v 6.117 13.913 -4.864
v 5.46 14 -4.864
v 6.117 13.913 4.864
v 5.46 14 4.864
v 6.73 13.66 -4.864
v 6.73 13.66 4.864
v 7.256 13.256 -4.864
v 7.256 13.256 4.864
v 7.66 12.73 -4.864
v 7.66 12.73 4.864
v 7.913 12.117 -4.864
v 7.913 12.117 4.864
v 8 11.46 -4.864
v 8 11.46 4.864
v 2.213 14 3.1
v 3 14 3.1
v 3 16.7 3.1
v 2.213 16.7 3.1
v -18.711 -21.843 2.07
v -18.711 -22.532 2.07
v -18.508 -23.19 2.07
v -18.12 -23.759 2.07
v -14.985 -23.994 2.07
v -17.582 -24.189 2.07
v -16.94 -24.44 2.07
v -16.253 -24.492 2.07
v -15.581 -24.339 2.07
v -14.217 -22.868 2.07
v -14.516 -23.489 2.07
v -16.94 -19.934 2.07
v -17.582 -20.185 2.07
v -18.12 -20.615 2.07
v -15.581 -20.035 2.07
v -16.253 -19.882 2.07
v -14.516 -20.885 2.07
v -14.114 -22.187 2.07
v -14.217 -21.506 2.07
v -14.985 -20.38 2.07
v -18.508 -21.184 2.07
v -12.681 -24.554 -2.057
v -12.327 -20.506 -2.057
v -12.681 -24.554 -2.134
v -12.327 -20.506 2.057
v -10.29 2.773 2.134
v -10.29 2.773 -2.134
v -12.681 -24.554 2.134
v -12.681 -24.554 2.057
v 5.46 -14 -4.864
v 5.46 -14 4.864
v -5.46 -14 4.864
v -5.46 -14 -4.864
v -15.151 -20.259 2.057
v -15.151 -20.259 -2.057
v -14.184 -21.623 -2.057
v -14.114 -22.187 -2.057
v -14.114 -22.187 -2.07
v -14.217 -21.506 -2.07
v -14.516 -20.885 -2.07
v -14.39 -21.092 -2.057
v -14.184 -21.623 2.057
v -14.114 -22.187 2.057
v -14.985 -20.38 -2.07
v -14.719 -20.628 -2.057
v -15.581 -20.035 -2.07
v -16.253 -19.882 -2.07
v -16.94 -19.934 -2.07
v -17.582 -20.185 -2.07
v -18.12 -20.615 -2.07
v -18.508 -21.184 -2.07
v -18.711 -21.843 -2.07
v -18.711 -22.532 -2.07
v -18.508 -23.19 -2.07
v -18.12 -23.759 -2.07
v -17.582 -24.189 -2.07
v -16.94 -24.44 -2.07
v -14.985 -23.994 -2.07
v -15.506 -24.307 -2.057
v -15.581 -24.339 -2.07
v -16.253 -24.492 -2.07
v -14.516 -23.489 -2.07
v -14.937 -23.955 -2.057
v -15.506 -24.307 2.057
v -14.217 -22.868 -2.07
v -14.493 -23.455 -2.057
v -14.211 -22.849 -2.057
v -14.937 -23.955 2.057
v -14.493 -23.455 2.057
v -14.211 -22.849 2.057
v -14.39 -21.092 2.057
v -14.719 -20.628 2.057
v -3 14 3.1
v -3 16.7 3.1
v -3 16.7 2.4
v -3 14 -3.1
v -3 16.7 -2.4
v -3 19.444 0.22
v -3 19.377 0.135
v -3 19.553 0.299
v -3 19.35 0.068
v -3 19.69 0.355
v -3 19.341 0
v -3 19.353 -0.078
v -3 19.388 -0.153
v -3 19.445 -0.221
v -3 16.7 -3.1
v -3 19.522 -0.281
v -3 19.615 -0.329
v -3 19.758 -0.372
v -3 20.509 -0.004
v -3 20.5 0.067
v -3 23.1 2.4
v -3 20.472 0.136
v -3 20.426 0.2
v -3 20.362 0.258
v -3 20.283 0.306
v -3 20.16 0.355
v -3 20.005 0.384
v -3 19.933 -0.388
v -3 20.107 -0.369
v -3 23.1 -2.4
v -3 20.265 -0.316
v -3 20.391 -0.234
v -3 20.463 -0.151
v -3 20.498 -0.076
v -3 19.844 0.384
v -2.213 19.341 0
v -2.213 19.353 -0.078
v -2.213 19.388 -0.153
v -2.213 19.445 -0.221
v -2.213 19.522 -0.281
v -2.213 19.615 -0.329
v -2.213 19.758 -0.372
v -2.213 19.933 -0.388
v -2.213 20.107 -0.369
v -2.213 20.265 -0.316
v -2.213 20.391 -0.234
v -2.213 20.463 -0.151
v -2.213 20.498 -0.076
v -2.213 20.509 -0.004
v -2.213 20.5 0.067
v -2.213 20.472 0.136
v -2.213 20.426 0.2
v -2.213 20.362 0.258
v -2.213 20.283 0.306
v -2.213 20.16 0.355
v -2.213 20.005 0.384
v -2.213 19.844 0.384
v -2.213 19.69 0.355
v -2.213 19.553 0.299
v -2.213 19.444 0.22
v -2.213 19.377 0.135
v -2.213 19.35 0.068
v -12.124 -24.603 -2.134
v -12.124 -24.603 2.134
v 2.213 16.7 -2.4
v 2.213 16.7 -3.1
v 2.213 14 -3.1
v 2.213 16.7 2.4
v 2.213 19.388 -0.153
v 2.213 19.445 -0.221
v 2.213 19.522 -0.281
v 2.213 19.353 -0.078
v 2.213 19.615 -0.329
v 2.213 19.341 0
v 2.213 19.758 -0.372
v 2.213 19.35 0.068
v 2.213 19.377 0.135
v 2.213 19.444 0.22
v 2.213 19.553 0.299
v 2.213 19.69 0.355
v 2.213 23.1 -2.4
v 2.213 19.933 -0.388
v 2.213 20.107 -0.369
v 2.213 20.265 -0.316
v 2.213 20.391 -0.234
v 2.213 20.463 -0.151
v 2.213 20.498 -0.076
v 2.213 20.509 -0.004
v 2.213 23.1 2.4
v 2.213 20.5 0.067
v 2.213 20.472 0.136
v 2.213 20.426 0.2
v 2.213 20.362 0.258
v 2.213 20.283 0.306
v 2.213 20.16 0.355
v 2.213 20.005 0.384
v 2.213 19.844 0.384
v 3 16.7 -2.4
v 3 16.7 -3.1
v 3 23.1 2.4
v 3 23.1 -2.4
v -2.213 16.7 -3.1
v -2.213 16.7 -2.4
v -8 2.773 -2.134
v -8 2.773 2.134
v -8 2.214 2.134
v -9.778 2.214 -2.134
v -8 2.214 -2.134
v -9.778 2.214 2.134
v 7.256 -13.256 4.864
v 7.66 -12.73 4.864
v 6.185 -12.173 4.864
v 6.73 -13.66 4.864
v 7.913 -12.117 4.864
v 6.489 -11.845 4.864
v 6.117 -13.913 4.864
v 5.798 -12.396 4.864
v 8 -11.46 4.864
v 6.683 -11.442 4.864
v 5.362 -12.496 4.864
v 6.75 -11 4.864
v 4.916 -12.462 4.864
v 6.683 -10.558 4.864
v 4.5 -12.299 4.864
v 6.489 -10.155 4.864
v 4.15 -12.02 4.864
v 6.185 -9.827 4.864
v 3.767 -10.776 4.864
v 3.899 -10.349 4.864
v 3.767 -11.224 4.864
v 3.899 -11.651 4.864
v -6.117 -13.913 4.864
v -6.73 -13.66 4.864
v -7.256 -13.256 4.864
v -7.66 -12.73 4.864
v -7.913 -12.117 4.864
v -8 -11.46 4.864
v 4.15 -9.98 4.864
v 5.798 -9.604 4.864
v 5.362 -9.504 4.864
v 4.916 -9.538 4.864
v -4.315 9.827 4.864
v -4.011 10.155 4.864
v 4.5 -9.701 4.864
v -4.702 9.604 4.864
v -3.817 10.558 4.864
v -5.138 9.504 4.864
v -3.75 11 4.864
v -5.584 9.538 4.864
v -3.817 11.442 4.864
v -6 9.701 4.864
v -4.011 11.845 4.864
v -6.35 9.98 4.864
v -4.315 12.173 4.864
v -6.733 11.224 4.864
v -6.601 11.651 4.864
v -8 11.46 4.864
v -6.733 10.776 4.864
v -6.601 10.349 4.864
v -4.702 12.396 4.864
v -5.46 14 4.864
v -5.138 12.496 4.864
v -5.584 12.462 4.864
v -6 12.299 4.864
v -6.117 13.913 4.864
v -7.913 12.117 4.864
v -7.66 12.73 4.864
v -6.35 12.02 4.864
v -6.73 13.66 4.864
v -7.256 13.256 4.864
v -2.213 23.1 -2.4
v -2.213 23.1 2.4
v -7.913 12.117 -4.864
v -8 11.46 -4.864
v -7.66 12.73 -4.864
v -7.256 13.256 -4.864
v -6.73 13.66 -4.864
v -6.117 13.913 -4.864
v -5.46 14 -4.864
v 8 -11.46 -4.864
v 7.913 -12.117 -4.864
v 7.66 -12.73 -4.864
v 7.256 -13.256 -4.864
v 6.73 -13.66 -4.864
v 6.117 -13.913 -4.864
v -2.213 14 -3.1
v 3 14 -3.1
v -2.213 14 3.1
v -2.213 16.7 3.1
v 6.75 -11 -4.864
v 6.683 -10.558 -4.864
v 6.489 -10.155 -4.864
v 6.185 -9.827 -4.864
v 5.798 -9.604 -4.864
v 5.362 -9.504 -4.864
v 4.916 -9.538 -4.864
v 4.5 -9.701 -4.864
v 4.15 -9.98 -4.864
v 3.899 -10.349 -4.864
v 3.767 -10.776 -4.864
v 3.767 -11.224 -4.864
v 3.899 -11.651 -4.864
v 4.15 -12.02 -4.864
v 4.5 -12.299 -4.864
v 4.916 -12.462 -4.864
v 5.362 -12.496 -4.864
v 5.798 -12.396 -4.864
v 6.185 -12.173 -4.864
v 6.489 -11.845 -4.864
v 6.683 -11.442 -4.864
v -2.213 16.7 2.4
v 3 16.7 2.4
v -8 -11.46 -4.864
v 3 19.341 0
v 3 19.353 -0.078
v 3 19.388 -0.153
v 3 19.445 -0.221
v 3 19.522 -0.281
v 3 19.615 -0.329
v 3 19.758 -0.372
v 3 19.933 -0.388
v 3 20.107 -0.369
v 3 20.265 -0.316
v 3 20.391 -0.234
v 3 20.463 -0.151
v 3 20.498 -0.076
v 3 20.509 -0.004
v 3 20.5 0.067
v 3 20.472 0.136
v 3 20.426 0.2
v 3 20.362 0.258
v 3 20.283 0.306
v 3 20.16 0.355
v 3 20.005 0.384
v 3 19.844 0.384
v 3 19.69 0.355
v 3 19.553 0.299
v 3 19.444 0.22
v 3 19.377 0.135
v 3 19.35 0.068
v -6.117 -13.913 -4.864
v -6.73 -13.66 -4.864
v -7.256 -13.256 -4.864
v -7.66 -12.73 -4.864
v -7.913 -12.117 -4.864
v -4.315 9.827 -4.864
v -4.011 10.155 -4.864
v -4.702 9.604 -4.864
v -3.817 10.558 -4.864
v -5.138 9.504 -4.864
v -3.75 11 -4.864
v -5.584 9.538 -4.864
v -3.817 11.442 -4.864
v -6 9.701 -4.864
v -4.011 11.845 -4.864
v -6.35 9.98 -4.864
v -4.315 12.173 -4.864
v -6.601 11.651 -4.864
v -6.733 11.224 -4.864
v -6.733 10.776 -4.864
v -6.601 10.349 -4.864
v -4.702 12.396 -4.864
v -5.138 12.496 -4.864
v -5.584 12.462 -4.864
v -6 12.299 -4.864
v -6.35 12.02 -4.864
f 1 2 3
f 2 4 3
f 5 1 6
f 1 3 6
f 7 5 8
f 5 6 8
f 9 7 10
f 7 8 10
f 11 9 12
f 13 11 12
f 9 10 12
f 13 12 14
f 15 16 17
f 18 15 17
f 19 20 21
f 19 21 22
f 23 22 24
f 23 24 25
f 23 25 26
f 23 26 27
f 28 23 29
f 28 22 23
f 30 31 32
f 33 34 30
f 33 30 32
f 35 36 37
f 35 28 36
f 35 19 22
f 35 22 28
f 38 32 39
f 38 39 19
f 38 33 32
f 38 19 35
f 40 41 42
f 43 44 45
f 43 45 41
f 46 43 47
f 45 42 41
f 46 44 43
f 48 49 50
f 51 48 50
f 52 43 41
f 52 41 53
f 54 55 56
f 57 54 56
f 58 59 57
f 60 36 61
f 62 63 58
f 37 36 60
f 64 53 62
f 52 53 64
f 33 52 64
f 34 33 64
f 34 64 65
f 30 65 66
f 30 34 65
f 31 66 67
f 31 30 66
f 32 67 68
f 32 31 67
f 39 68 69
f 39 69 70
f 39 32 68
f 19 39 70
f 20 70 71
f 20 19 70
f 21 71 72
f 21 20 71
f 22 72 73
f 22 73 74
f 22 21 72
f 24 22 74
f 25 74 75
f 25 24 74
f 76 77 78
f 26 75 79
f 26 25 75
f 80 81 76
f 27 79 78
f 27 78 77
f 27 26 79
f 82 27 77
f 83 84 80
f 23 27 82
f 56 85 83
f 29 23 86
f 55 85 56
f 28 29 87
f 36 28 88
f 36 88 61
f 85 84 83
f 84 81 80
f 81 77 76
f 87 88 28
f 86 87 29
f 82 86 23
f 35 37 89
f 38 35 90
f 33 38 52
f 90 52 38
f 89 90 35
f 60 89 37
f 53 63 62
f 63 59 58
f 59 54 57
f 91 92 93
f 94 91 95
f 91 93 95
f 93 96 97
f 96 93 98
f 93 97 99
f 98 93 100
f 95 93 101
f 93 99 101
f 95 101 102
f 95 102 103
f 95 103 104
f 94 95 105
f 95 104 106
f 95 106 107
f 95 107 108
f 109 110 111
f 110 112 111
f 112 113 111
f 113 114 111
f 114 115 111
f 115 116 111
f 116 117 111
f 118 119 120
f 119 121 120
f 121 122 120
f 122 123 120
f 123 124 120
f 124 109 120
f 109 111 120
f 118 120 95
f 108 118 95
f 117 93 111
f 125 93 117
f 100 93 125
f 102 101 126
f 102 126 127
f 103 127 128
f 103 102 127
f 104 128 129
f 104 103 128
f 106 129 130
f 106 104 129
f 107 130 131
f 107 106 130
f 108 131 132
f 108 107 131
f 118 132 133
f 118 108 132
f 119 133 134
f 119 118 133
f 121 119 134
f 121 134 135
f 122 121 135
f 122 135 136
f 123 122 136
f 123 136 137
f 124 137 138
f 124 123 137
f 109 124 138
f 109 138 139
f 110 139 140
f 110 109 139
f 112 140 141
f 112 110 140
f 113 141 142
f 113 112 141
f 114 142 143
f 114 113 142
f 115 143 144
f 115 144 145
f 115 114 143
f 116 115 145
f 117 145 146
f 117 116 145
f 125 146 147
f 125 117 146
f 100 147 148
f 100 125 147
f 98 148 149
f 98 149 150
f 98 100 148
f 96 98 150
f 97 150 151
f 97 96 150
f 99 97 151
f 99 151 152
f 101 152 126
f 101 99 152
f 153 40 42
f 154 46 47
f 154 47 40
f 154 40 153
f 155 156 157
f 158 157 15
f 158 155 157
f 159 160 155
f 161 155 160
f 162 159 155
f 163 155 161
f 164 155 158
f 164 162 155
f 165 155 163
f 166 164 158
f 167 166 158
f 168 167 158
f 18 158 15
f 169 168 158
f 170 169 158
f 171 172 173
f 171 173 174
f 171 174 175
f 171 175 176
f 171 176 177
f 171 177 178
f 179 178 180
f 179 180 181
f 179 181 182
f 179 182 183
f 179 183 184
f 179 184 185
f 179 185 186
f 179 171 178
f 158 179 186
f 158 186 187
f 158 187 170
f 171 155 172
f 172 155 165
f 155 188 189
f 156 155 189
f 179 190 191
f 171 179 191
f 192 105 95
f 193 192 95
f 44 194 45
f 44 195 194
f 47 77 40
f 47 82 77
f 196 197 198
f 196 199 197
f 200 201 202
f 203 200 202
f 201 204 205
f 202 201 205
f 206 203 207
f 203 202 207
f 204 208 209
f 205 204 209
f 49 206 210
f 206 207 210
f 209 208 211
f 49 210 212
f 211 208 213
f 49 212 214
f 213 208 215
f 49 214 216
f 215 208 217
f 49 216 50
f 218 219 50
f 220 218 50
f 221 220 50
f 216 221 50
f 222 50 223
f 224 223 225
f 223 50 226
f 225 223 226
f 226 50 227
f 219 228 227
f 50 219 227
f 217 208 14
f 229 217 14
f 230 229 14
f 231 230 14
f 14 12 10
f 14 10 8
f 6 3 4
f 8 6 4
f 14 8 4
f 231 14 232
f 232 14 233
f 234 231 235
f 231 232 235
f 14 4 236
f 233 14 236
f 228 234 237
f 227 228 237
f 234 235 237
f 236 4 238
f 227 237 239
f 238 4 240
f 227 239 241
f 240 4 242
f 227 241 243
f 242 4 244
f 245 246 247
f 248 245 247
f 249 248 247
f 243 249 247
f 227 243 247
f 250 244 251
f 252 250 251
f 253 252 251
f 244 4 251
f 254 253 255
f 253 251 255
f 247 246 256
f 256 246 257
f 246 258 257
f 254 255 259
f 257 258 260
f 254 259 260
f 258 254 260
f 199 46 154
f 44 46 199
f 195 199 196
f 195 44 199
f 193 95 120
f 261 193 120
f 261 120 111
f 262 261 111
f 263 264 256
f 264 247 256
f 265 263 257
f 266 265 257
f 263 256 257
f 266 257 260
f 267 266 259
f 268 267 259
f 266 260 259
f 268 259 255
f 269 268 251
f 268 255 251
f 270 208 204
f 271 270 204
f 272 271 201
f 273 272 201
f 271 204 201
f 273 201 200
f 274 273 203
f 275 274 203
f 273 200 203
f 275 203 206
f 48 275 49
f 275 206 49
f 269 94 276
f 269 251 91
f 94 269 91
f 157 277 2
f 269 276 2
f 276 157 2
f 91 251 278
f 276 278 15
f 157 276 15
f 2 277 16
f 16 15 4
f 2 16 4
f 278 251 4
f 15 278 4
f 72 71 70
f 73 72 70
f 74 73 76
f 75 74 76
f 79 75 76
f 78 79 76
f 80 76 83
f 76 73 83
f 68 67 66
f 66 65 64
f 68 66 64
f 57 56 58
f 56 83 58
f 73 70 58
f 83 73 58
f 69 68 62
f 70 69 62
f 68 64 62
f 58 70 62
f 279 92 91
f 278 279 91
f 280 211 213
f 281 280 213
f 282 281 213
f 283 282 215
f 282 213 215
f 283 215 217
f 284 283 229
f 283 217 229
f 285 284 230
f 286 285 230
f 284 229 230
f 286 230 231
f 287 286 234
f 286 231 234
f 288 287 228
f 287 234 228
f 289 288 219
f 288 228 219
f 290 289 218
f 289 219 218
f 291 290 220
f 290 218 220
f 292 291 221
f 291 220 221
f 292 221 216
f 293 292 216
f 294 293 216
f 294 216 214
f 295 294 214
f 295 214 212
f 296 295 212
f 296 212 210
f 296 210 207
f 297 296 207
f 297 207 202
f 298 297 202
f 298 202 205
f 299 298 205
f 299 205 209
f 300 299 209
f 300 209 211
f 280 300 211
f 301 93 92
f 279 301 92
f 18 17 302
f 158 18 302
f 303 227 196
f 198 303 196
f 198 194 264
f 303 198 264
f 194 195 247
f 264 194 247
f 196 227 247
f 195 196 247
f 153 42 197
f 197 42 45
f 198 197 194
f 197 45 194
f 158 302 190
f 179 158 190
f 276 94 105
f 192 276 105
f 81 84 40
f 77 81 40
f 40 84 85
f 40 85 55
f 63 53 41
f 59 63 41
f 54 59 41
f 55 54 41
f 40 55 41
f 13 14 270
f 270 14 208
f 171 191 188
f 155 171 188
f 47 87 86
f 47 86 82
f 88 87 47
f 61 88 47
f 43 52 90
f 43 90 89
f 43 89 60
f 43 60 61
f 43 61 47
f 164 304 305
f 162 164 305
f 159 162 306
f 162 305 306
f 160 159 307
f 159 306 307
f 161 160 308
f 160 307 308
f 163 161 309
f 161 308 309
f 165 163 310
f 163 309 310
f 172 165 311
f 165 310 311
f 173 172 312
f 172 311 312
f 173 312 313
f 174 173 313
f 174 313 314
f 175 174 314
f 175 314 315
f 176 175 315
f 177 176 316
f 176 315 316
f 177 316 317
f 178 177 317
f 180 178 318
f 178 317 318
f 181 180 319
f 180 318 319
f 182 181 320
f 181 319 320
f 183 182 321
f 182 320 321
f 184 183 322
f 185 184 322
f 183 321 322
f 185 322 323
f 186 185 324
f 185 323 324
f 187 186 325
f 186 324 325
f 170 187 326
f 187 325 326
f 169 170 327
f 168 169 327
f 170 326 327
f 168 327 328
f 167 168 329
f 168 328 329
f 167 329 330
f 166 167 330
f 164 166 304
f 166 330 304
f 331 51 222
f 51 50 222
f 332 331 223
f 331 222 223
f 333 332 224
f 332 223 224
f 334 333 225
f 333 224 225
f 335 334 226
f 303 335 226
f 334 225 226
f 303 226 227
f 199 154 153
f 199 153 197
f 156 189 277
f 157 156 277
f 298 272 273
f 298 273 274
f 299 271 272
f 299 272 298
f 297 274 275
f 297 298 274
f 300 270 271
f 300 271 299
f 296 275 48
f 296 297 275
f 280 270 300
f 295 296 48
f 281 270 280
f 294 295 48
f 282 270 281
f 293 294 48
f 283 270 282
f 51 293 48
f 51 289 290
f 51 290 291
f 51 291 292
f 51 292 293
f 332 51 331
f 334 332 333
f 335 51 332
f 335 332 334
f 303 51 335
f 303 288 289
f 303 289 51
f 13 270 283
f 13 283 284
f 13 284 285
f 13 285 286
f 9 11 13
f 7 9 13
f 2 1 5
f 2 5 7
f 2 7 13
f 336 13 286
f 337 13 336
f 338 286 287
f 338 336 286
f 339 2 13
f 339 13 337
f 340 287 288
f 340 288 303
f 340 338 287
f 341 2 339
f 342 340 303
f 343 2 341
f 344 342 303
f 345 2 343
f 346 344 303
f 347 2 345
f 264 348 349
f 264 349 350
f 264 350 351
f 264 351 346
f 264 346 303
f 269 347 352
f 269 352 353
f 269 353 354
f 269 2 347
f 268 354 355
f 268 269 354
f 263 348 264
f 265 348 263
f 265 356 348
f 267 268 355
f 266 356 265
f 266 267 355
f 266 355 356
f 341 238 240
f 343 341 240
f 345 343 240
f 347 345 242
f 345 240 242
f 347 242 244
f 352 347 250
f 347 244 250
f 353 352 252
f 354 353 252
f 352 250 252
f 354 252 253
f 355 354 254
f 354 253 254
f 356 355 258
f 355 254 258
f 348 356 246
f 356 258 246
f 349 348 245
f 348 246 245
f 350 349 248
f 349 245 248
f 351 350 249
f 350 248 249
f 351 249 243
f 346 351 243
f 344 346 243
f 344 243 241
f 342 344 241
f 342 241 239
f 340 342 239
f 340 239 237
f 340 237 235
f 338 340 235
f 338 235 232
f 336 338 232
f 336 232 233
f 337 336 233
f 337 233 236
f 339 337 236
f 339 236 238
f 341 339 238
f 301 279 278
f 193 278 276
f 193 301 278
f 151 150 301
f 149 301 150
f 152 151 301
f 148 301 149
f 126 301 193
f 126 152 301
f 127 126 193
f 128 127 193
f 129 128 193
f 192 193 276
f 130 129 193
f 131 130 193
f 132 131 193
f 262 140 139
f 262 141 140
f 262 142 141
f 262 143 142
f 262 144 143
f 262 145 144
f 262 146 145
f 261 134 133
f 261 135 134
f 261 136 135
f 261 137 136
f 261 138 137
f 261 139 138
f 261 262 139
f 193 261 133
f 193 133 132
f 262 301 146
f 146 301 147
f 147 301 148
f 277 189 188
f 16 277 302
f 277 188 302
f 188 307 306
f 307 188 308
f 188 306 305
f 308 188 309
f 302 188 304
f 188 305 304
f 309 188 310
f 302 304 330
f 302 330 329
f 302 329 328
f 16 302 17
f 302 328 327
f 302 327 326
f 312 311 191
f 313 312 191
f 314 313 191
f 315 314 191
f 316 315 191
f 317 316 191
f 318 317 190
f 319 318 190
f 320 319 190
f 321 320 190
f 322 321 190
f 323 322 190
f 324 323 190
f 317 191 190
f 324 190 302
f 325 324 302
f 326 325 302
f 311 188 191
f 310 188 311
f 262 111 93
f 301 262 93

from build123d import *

# Parameters (mm, degrees)
BOSS_EXTRUDE1_DEPTH = 4.8641
SKETCH2_RX          = 0.5842
SKETCH2_RY          = 0.387956749
BOSS_EXTRUDE2_DEPTH = 0.7874
SKETCH4_RX          = 0.5842
SKETCH4_RY          = 0.387956749
BOSS_EXTRUDE3_DEPTH = 0.7874
BOSS_EXTRUDE5_DEPTH = 2.1336
BOSS_EXTRUDE6_DEPTH = 2.0574
BOSS_EXTRUDE7_DEPTH = 2.0701
SKETCH6_R           = 1.5
CUT_EXTRUDE1_DEPTH  = 33.419663703


with BuildPart() as part:
    # Sketch1 → Boss-Extrude1 (new, symmetric)
    with BuildSketch(Plane.XY):
        with BuildLine():
            Line((5.46, -14), (-5.46, -14))
            ThreePointArc((-5.46, -14), (-7.256051224, -13.256051224), (-8, -11.46))
            Line((-8, -11.46), (-8, 11.46))
            ThreePointArc((-8, 11.46), (-7.256051224, 13.256051224), (-5.46, 14))
            Line((-5.46, 14), (5.46, 14))
            ThreePointArc((5.46, 14), (7.256051224, 13.256051224), (8, 11.46))
            Line((8, 11.46), (8, -11.46))
            ThreePointArc((8, -11.46), (7.256051224, -13.256051224), (5.46, -14))
        make_face()
    extrude(amount=BOSS_EXTRUDE1_DEPTH, both=True)

    # Sketch2 → Boss-Extrude2 (add)
    with BuildSketch(Plane(origin=(3, 0, 0), x_dir=(0, 0, -1), z_dir=(1, 0, 0))):
        Polygon((-3.1, 14), (-3.1, 16.7), (-2.4, 16.7), (-2.4, 23.1), (2.4, 23.1), (2.4, 16.7), (3.1, 16.7), (3.1, 14), align=None)
        with Locations(Location((0, 19.925), (0, 0, -90))):
            Ellipse(SKETCH2_RX, SKETCH2_RY, mode=Mode.SUBTRACT)
    extrude(amount=-BOSS_EXTRUDE2_DEPTH)

    # Sketch4 → Boss-Extrude3 (add)
    with BuildSketch(Plane(origin=(-3, 0, 0), x_dir=(0, 0, -1), z_dir=(1, 0, 0))):
        Polygon((2.4, 16.7), (2.4, 23.1), (-2.4, 23.1), (-2.4, 16.7), (-3.1, 16.7), (-3.1, 14), (3.1, 14), (3.1, 16.7), align=None)
        with Locations(Location((0, 19.925), (0, 0, -90))):
            Ellipse(SKETCH4_RX, SKETCH4_RY, mode=Mode.SUBTRACT)
    extrude(amount=BOSS_EXTRUDE3_DEPTH)

    # Sketch5 → Boss-Extrude5 (add, symmetric)
    with BuildSketch(Plane.XY):
        Polygon((-8, 2.7732), (-10.29004586, 2.7732), (-12.680902195, -24.554412958), (-12.124228598, -24.603115587), (-9.778, 2.2144), (-8, 2.2144), align=None)
    extrude(amount=BOSS_EXTRUDE5_DEPTH, both=True)

    # Sketch5<6> → Boss-Extrude6 (add, symmetric)
    with BuildSketch(Plane.XY):
        with BuildLine():
            Line((-12.680902195, -24.554412958), (-12.326701257, -20.505877705))
            Line((-12.326701257, -20.505877705), (-15.151301123, -20.258757238))
            ThreePointArc((-15.151301123, -20.258757238), (-14.390077946, -21.092333666), (-14.114420252, -22.187013172))
            ThreePointArc((-14.114420252, -22.187013172), (-14.493232166, -23.454953726), (-15.505502062, -24.307292491))
            Line((-15.505502062, -24.307292491), (-12.680902195, -24.554412958))
        make_face()
    extrude(amount=BOSS_EXTRUDE6_DEPTH, both=True)

    # Sketch5<7> → Boss-Extrude7 (add, symmetric)
    with BuildSketch(Plane.XY):
        with BuildLine():
            ThreePointArc((-14.114420252, -22.187013172), (-14.390077946, -21.092333666), (-15.151301123, -20.258757238))
            ThreePointArc((-15.151301123, -20.258757238), (-18.728424677, -21.985561389), (-15.505502062, -24.307292491))
            ThreePointArc((-15.505502062, -24.307292491), (-14.493232166, -23.454953726), (-14.114420252, -22.187013172))
        make_face()
    extrude(amount=BOSS_EXTRUDE7_DEPTH, both=True)

    # Sketch6 → Cut-Extrude1 (cut, through all)
    with BuildSketch(Plane.XY.offset(4.8641)):
        with Locations((-5.25, 11)):
            Circle(SKETCH6_R)
        with Locations((5.25, -11)):
            Circle(SKETCH6_R)
    extrude(amount=-CUT_EXTRUDE1_DEPTH, mode=Mode.SUBTRACT)


solid = part.part
